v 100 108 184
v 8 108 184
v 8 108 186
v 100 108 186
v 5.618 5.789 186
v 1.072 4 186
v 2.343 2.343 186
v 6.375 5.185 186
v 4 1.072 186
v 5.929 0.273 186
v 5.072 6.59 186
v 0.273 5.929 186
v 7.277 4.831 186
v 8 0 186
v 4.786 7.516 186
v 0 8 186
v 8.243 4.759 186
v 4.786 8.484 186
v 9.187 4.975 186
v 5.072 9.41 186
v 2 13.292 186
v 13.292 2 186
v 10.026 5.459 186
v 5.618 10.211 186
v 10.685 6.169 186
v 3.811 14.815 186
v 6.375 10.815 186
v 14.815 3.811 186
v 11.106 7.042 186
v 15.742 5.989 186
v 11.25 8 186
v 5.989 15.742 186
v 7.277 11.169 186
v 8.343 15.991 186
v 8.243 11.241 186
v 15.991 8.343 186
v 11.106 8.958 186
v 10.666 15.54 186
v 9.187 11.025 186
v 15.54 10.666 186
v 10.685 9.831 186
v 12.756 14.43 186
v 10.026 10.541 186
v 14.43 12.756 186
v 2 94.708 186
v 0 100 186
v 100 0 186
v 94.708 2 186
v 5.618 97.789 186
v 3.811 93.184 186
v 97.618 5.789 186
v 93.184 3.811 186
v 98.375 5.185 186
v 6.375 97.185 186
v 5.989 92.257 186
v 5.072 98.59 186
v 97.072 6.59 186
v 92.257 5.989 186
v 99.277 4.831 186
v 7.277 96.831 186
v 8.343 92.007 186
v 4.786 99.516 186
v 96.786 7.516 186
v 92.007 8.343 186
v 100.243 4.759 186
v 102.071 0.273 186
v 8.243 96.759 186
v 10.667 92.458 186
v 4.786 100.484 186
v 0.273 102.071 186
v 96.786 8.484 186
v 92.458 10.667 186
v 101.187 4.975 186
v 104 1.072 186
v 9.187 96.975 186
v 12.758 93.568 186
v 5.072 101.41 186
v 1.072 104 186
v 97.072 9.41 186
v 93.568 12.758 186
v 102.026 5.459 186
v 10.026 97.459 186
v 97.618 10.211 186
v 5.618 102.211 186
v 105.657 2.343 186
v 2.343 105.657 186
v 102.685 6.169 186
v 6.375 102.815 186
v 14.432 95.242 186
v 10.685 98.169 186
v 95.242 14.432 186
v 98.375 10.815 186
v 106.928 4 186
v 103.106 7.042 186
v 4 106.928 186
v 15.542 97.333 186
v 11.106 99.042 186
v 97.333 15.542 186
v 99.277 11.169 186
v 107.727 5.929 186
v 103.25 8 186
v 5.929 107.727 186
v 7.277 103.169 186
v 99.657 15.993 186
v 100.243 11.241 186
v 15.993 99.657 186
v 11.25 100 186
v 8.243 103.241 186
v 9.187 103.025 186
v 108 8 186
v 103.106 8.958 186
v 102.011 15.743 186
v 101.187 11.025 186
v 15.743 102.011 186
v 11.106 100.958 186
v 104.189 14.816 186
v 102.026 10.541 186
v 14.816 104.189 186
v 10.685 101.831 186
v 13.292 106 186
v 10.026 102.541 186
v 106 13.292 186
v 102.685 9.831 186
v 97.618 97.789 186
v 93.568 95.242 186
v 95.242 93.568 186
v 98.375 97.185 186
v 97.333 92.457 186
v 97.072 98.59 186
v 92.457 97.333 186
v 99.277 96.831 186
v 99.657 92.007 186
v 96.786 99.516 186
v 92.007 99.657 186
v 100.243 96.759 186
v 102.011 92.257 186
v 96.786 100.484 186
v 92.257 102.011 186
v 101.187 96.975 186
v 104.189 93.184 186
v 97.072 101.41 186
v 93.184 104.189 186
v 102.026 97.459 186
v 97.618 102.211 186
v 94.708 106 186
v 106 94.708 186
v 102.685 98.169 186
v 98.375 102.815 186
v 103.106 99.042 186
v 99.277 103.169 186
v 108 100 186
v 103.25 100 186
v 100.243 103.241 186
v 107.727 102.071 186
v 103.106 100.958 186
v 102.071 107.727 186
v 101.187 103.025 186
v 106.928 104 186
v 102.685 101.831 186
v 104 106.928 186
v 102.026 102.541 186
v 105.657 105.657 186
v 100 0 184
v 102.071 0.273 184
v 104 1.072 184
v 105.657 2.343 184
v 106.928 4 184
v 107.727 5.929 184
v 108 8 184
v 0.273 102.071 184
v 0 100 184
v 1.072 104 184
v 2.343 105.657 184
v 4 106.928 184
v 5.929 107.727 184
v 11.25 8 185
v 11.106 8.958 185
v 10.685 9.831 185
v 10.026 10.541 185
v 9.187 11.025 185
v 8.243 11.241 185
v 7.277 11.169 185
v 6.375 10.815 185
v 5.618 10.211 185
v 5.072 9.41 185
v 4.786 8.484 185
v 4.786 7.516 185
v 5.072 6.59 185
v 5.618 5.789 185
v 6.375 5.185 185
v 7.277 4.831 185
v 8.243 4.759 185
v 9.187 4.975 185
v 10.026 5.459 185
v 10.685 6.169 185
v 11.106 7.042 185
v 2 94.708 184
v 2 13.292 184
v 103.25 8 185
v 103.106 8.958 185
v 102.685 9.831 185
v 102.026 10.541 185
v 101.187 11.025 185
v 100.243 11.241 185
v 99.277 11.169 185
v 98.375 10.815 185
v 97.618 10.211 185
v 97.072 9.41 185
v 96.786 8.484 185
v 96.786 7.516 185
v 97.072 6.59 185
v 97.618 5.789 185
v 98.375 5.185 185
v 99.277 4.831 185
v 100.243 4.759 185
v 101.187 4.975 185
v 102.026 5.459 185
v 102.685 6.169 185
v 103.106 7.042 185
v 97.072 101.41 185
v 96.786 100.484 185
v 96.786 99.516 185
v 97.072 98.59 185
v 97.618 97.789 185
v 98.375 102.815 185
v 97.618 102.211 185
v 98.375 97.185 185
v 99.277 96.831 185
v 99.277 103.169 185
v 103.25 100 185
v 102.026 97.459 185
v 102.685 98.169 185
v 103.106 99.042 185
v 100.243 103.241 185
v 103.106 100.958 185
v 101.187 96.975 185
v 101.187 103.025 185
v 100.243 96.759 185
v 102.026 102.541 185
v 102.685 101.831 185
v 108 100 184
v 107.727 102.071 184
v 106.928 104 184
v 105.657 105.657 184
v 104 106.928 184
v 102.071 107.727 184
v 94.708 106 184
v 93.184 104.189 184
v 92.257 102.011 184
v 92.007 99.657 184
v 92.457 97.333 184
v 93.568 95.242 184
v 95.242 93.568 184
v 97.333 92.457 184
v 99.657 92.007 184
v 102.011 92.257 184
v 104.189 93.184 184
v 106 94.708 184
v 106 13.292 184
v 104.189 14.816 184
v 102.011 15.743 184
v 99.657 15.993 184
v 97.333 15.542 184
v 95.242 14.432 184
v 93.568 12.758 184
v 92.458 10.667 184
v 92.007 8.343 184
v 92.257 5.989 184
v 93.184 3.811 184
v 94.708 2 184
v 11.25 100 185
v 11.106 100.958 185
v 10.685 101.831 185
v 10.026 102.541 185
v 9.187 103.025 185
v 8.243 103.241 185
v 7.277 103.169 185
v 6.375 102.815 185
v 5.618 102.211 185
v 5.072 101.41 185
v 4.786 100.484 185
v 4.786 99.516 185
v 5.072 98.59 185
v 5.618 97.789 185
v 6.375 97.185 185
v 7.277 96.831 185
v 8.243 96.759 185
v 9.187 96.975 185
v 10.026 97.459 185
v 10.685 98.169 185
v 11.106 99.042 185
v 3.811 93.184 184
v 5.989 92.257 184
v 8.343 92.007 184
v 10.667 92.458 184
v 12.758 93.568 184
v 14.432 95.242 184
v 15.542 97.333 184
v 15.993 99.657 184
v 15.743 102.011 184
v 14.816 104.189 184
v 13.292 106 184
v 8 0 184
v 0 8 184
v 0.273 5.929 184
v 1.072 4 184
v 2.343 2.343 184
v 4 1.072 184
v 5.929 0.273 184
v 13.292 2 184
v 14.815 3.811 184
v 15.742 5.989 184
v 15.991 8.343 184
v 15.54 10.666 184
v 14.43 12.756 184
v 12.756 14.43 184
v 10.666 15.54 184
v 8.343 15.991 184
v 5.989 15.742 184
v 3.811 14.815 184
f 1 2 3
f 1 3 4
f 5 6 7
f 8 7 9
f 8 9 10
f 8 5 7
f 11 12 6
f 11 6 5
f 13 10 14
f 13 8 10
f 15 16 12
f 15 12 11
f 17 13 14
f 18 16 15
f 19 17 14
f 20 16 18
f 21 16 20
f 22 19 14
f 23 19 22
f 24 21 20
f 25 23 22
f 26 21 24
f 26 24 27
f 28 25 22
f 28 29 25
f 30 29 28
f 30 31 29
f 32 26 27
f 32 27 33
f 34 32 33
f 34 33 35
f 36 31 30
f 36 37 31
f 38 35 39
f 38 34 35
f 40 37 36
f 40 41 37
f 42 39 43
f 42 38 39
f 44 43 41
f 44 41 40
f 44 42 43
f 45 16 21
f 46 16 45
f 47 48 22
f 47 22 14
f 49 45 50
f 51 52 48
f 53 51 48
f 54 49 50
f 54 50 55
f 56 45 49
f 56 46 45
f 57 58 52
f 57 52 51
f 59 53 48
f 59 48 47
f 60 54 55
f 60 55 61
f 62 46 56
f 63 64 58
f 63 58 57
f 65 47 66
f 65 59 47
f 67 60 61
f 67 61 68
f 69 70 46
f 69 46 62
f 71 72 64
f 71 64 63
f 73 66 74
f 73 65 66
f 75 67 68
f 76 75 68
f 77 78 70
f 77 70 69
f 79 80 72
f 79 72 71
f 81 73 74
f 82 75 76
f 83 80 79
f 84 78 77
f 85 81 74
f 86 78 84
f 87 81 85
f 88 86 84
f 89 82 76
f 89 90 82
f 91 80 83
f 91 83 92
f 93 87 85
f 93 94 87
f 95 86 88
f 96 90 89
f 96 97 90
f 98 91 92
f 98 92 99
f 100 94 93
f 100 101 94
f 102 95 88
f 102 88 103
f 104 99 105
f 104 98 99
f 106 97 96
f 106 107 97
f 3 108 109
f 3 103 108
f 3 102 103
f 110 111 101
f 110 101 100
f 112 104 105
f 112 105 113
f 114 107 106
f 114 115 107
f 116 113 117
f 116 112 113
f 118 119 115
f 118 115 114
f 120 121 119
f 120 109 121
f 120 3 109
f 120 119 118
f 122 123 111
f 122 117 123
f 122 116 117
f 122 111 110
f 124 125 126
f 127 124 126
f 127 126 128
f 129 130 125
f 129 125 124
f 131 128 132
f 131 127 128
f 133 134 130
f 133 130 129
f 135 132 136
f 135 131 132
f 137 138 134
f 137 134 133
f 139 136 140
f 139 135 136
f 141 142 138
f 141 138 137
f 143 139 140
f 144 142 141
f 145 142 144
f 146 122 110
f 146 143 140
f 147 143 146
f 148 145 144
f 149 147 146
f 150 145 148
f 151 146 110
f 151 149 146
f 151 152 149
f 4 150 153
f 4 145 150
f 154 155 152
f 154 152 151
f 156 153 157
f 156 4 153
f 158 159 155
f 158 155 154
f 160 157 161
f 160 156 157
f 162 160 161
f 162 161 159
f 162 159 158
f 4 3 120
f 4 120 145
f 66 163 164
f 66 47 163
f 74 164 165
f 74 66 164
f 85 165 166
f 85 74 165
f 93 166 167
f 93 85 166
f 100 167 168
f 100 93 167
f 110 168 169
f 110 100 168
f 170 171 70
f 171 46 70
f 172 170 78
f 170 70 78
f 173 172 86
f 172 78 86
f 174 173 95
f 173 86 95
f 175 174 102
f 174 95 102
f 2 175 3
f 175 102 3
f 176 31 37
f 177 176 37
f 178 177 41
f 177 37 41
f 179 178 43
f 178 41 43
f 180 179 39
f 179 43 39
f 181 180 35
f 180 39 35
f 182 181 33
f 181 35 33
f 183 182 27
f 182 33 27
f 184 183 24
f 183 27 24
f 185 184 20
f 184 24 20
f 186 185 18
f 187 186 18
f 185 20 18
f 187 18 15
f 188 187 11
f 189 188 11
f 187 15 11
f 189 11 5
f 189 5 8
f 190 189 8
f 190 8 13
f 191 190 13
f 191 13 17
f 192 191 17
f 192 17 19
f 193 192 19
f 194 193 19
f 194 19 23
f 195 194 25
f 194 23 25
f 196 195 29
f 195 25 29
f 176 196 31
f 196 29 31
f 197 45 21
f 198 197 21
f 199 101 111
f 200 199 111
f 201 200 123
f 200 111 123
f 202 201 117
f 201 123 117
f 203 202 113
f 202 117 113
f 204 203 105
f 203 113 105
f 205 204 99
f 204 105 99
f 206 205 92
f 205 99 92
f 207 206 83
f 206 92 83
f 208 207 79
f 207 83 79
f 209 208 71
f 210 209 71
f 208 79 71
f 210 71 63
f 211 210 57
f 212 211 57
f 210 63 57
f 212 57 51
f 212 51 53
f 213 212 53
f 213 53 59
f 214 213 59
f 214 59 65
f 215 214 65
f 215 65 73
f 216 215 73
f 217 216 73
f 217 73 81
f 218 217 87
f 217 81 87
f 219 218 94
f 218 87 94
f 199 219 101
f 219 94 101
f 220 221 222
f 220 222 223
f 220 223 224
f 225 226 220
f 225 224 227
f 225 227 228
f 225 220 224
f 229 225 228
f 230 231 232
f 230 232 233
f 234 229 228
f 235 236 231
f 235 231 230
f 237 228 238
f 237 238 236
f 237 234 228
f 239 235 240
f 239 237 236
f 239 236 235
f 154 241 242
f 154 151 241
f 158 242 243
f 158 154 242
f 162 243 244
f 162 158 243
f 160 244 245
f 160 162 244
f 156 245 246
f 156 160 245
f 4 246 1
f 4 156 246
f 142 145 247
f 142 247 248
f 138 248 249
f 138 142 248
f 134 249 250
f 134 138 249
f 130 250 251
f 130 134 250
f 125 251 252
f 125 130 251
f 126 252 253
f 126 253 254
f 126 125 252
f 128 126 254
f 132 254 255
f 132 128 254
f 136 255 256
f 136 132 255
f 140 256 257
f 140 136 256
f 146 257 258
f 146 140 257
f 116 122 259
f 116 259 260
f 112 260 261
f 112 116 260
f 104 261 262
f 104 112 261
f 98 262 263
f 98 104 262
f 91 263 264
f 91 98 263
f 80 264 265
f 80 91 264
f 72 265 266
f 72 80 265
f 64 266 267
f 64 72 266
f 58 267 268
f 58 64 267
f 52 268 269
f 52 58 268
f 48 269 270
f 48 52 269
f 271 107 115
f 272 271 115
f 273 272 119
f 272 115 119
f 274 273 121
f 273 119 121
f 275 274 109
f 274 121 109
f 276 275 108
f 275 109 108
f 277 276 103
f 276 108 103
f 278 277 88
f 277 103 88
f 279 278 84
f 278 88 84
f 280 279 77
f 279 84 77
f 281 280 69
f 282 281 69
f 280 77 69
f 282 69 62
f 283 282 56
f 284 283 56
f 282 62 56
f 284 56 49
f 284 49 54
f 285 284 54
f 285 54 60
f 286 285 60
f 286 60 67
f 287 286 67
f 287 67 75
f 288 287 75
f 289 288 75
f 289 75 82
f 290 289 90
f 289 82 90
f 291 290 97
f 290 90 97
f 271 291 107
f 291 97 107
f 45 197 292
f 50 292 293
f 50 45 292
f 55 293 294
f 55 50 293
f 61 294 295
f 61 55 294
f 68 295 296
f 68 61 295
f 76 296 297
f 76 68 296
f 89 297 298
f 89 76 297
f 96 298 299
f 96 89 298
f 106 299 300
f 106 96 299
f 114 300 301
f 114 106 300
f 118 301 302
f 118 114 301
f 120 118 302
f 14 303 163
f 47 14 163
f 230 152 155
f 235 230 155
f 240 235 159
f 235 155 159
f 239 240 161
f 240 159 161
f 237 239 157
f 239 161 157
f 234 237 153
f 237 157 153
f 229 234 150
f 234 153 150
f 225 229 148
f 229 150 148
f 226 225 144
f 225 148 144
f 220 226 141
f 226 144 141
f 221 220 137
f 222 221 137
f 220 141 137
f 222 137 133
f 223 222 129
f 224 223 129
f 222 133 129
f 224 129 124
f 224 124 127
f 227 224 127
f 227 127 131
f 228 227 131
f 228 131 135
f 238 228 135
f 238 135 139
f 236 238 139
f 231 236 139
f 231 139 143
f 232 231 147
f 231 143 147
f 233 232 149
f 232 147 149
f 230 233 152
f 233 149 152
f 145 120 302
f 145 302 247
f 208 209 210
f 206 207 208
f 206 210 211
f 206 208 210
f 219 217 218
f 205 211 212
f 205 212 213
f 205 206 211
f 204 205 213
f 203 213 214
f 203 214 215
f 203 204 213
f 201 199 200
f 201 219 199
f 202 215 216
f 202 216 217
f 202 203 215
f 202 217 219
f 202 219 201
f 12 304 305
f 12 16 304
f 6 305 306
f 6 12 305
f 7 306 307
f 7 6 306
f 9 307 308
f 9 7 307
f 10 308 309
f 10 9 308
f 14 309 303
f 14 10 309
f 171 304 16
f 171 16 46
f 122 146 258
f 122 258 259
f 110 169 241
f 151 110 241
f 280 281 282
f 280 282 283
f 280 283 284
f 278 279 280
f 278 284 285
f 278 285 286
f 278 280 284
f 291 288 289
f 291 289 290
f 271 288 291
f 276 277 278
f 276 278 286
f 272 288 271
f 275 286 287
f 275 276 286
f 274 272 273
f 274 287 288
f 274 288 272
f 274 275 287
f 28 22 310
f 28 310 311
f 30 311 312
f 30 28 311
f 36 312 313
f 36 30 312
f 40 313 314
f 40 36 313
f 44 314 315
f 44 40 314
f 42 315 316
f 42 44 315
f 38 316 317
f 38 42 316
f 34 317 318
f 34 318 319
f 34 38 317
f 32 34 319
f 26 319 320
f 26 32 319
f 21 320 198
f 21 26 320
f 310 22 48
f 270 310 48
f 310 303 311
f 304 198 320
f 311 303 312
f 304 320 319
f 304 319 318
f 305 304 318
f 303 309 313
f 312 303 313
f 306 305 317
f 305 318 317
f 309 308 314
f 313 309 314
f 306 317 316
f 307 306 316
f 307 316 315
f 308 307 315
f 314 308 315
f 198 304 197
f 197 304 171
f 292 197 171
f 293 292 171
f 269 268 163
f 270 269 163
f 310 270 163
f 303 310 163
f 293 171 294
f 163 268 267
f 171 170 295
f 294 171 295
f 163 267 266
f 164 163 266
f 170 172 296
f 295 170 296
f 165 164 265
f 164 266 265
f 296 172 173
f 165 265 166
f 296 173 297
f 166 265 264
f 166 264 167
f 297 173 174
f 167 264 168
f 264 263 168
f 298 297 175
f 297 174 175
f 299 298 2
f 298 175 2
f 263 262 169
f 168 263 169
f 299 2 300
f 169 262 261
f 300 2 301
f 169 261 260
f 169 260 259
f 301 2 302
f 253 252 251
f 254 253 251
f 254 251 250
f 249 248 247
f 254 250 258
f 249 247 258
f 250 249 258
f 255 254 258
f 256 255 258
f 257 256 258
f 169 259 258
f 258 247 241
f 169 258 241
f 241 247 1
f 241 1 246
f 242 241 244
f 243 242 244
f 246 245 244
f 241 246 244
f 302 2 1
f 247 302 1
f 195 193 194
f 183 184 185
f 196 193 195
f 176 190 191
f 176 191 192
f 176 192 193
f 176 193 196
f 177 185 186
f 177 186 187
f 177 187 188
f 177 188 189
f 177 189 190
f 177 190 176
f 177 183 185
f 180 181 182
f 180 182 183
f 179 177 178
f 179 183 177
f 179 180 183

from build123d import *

# Parameters (mm, degrees)
SKETCH125_W     = 108
SKETCH125_H     = 108
PAD050_DEPTH    = 2
FILLET009_R     = 8
SKETCH126_R     = 3.25
POCKET049_DEPTH = 1
POCKET048_DEPTH = 2.001


with BuildPart() as part:
    # Sketch125 → Pad050 (new body)
    with BuildSketch(Plane.XY):
        with Locations((54, 54)):
            Rectangle(SKETCH125_W, SKETCH125_H)
    extrude(amount=PAD050_DEPTH)

    # Fillet009
    fillet009_edges = [part.edges().sort_by_distance(p)[0] for p in [
        (108, 0, 1),
        (108, 108, 1),
        (0, 108, 1),
        (0, 0, 1),
    ]]
    fillet(fillet009_edges, radius=FILLET009_R)

    # Sketch126 (on Face5 of Fillet009) → Pocket049 (cut)
    with BuildSketch(Plane.XY.offset(2)):
        with Locations((8, 8)):
            Circle(SKETCH126_R)
        with Locations((100, 8)):
            Circle(SKETCH126_R)
        with Locations((100, 100)):
            Circle(SKETCH126_R)
        with Locations((8, 100)):
            Circle(SKETCH126_R)
    extrude(amount=-POCKET049_DEPTH, mode=Mode.SUBTRACT)

    # Sketch127 (on Face5 of Pocket049) → Pocket048 (cut, through all)
    with BuildSketch(Plane.XY.offset(2)):
        with BuildLine():
            Line((2, 94.708497), (2, 13.291503))
            ThreePointArc((13.291503, 2), (13.655204, 13.655204), (2, 13.291503))
            Line((13.291503, 2), (94.708497, 2))
            ThreePointArc((106, 13.291503), (94.343146, 13.656854), (94.708497, 2))
            Line((106, 94.708497), (106, 13.291503))
            ThreePointArc((94.708497, 106), (94.342737, 94.342737), (106, 94.708497))
            Line((13.291503, 106), (94.708497, 106))
            ThreePointArc((2, 94.708497), (13.656854, 94.343146), (13.291503, 106))
        make_face()
    extrude(amount=-POCKET048_DEPTH, mode=Mode.SUBTRACT)


with BuildPart() as part_1:
    # Body022 placement: moved
    add(part.part.moved(Location((0, 0, 184))))


solid = part_1.part
